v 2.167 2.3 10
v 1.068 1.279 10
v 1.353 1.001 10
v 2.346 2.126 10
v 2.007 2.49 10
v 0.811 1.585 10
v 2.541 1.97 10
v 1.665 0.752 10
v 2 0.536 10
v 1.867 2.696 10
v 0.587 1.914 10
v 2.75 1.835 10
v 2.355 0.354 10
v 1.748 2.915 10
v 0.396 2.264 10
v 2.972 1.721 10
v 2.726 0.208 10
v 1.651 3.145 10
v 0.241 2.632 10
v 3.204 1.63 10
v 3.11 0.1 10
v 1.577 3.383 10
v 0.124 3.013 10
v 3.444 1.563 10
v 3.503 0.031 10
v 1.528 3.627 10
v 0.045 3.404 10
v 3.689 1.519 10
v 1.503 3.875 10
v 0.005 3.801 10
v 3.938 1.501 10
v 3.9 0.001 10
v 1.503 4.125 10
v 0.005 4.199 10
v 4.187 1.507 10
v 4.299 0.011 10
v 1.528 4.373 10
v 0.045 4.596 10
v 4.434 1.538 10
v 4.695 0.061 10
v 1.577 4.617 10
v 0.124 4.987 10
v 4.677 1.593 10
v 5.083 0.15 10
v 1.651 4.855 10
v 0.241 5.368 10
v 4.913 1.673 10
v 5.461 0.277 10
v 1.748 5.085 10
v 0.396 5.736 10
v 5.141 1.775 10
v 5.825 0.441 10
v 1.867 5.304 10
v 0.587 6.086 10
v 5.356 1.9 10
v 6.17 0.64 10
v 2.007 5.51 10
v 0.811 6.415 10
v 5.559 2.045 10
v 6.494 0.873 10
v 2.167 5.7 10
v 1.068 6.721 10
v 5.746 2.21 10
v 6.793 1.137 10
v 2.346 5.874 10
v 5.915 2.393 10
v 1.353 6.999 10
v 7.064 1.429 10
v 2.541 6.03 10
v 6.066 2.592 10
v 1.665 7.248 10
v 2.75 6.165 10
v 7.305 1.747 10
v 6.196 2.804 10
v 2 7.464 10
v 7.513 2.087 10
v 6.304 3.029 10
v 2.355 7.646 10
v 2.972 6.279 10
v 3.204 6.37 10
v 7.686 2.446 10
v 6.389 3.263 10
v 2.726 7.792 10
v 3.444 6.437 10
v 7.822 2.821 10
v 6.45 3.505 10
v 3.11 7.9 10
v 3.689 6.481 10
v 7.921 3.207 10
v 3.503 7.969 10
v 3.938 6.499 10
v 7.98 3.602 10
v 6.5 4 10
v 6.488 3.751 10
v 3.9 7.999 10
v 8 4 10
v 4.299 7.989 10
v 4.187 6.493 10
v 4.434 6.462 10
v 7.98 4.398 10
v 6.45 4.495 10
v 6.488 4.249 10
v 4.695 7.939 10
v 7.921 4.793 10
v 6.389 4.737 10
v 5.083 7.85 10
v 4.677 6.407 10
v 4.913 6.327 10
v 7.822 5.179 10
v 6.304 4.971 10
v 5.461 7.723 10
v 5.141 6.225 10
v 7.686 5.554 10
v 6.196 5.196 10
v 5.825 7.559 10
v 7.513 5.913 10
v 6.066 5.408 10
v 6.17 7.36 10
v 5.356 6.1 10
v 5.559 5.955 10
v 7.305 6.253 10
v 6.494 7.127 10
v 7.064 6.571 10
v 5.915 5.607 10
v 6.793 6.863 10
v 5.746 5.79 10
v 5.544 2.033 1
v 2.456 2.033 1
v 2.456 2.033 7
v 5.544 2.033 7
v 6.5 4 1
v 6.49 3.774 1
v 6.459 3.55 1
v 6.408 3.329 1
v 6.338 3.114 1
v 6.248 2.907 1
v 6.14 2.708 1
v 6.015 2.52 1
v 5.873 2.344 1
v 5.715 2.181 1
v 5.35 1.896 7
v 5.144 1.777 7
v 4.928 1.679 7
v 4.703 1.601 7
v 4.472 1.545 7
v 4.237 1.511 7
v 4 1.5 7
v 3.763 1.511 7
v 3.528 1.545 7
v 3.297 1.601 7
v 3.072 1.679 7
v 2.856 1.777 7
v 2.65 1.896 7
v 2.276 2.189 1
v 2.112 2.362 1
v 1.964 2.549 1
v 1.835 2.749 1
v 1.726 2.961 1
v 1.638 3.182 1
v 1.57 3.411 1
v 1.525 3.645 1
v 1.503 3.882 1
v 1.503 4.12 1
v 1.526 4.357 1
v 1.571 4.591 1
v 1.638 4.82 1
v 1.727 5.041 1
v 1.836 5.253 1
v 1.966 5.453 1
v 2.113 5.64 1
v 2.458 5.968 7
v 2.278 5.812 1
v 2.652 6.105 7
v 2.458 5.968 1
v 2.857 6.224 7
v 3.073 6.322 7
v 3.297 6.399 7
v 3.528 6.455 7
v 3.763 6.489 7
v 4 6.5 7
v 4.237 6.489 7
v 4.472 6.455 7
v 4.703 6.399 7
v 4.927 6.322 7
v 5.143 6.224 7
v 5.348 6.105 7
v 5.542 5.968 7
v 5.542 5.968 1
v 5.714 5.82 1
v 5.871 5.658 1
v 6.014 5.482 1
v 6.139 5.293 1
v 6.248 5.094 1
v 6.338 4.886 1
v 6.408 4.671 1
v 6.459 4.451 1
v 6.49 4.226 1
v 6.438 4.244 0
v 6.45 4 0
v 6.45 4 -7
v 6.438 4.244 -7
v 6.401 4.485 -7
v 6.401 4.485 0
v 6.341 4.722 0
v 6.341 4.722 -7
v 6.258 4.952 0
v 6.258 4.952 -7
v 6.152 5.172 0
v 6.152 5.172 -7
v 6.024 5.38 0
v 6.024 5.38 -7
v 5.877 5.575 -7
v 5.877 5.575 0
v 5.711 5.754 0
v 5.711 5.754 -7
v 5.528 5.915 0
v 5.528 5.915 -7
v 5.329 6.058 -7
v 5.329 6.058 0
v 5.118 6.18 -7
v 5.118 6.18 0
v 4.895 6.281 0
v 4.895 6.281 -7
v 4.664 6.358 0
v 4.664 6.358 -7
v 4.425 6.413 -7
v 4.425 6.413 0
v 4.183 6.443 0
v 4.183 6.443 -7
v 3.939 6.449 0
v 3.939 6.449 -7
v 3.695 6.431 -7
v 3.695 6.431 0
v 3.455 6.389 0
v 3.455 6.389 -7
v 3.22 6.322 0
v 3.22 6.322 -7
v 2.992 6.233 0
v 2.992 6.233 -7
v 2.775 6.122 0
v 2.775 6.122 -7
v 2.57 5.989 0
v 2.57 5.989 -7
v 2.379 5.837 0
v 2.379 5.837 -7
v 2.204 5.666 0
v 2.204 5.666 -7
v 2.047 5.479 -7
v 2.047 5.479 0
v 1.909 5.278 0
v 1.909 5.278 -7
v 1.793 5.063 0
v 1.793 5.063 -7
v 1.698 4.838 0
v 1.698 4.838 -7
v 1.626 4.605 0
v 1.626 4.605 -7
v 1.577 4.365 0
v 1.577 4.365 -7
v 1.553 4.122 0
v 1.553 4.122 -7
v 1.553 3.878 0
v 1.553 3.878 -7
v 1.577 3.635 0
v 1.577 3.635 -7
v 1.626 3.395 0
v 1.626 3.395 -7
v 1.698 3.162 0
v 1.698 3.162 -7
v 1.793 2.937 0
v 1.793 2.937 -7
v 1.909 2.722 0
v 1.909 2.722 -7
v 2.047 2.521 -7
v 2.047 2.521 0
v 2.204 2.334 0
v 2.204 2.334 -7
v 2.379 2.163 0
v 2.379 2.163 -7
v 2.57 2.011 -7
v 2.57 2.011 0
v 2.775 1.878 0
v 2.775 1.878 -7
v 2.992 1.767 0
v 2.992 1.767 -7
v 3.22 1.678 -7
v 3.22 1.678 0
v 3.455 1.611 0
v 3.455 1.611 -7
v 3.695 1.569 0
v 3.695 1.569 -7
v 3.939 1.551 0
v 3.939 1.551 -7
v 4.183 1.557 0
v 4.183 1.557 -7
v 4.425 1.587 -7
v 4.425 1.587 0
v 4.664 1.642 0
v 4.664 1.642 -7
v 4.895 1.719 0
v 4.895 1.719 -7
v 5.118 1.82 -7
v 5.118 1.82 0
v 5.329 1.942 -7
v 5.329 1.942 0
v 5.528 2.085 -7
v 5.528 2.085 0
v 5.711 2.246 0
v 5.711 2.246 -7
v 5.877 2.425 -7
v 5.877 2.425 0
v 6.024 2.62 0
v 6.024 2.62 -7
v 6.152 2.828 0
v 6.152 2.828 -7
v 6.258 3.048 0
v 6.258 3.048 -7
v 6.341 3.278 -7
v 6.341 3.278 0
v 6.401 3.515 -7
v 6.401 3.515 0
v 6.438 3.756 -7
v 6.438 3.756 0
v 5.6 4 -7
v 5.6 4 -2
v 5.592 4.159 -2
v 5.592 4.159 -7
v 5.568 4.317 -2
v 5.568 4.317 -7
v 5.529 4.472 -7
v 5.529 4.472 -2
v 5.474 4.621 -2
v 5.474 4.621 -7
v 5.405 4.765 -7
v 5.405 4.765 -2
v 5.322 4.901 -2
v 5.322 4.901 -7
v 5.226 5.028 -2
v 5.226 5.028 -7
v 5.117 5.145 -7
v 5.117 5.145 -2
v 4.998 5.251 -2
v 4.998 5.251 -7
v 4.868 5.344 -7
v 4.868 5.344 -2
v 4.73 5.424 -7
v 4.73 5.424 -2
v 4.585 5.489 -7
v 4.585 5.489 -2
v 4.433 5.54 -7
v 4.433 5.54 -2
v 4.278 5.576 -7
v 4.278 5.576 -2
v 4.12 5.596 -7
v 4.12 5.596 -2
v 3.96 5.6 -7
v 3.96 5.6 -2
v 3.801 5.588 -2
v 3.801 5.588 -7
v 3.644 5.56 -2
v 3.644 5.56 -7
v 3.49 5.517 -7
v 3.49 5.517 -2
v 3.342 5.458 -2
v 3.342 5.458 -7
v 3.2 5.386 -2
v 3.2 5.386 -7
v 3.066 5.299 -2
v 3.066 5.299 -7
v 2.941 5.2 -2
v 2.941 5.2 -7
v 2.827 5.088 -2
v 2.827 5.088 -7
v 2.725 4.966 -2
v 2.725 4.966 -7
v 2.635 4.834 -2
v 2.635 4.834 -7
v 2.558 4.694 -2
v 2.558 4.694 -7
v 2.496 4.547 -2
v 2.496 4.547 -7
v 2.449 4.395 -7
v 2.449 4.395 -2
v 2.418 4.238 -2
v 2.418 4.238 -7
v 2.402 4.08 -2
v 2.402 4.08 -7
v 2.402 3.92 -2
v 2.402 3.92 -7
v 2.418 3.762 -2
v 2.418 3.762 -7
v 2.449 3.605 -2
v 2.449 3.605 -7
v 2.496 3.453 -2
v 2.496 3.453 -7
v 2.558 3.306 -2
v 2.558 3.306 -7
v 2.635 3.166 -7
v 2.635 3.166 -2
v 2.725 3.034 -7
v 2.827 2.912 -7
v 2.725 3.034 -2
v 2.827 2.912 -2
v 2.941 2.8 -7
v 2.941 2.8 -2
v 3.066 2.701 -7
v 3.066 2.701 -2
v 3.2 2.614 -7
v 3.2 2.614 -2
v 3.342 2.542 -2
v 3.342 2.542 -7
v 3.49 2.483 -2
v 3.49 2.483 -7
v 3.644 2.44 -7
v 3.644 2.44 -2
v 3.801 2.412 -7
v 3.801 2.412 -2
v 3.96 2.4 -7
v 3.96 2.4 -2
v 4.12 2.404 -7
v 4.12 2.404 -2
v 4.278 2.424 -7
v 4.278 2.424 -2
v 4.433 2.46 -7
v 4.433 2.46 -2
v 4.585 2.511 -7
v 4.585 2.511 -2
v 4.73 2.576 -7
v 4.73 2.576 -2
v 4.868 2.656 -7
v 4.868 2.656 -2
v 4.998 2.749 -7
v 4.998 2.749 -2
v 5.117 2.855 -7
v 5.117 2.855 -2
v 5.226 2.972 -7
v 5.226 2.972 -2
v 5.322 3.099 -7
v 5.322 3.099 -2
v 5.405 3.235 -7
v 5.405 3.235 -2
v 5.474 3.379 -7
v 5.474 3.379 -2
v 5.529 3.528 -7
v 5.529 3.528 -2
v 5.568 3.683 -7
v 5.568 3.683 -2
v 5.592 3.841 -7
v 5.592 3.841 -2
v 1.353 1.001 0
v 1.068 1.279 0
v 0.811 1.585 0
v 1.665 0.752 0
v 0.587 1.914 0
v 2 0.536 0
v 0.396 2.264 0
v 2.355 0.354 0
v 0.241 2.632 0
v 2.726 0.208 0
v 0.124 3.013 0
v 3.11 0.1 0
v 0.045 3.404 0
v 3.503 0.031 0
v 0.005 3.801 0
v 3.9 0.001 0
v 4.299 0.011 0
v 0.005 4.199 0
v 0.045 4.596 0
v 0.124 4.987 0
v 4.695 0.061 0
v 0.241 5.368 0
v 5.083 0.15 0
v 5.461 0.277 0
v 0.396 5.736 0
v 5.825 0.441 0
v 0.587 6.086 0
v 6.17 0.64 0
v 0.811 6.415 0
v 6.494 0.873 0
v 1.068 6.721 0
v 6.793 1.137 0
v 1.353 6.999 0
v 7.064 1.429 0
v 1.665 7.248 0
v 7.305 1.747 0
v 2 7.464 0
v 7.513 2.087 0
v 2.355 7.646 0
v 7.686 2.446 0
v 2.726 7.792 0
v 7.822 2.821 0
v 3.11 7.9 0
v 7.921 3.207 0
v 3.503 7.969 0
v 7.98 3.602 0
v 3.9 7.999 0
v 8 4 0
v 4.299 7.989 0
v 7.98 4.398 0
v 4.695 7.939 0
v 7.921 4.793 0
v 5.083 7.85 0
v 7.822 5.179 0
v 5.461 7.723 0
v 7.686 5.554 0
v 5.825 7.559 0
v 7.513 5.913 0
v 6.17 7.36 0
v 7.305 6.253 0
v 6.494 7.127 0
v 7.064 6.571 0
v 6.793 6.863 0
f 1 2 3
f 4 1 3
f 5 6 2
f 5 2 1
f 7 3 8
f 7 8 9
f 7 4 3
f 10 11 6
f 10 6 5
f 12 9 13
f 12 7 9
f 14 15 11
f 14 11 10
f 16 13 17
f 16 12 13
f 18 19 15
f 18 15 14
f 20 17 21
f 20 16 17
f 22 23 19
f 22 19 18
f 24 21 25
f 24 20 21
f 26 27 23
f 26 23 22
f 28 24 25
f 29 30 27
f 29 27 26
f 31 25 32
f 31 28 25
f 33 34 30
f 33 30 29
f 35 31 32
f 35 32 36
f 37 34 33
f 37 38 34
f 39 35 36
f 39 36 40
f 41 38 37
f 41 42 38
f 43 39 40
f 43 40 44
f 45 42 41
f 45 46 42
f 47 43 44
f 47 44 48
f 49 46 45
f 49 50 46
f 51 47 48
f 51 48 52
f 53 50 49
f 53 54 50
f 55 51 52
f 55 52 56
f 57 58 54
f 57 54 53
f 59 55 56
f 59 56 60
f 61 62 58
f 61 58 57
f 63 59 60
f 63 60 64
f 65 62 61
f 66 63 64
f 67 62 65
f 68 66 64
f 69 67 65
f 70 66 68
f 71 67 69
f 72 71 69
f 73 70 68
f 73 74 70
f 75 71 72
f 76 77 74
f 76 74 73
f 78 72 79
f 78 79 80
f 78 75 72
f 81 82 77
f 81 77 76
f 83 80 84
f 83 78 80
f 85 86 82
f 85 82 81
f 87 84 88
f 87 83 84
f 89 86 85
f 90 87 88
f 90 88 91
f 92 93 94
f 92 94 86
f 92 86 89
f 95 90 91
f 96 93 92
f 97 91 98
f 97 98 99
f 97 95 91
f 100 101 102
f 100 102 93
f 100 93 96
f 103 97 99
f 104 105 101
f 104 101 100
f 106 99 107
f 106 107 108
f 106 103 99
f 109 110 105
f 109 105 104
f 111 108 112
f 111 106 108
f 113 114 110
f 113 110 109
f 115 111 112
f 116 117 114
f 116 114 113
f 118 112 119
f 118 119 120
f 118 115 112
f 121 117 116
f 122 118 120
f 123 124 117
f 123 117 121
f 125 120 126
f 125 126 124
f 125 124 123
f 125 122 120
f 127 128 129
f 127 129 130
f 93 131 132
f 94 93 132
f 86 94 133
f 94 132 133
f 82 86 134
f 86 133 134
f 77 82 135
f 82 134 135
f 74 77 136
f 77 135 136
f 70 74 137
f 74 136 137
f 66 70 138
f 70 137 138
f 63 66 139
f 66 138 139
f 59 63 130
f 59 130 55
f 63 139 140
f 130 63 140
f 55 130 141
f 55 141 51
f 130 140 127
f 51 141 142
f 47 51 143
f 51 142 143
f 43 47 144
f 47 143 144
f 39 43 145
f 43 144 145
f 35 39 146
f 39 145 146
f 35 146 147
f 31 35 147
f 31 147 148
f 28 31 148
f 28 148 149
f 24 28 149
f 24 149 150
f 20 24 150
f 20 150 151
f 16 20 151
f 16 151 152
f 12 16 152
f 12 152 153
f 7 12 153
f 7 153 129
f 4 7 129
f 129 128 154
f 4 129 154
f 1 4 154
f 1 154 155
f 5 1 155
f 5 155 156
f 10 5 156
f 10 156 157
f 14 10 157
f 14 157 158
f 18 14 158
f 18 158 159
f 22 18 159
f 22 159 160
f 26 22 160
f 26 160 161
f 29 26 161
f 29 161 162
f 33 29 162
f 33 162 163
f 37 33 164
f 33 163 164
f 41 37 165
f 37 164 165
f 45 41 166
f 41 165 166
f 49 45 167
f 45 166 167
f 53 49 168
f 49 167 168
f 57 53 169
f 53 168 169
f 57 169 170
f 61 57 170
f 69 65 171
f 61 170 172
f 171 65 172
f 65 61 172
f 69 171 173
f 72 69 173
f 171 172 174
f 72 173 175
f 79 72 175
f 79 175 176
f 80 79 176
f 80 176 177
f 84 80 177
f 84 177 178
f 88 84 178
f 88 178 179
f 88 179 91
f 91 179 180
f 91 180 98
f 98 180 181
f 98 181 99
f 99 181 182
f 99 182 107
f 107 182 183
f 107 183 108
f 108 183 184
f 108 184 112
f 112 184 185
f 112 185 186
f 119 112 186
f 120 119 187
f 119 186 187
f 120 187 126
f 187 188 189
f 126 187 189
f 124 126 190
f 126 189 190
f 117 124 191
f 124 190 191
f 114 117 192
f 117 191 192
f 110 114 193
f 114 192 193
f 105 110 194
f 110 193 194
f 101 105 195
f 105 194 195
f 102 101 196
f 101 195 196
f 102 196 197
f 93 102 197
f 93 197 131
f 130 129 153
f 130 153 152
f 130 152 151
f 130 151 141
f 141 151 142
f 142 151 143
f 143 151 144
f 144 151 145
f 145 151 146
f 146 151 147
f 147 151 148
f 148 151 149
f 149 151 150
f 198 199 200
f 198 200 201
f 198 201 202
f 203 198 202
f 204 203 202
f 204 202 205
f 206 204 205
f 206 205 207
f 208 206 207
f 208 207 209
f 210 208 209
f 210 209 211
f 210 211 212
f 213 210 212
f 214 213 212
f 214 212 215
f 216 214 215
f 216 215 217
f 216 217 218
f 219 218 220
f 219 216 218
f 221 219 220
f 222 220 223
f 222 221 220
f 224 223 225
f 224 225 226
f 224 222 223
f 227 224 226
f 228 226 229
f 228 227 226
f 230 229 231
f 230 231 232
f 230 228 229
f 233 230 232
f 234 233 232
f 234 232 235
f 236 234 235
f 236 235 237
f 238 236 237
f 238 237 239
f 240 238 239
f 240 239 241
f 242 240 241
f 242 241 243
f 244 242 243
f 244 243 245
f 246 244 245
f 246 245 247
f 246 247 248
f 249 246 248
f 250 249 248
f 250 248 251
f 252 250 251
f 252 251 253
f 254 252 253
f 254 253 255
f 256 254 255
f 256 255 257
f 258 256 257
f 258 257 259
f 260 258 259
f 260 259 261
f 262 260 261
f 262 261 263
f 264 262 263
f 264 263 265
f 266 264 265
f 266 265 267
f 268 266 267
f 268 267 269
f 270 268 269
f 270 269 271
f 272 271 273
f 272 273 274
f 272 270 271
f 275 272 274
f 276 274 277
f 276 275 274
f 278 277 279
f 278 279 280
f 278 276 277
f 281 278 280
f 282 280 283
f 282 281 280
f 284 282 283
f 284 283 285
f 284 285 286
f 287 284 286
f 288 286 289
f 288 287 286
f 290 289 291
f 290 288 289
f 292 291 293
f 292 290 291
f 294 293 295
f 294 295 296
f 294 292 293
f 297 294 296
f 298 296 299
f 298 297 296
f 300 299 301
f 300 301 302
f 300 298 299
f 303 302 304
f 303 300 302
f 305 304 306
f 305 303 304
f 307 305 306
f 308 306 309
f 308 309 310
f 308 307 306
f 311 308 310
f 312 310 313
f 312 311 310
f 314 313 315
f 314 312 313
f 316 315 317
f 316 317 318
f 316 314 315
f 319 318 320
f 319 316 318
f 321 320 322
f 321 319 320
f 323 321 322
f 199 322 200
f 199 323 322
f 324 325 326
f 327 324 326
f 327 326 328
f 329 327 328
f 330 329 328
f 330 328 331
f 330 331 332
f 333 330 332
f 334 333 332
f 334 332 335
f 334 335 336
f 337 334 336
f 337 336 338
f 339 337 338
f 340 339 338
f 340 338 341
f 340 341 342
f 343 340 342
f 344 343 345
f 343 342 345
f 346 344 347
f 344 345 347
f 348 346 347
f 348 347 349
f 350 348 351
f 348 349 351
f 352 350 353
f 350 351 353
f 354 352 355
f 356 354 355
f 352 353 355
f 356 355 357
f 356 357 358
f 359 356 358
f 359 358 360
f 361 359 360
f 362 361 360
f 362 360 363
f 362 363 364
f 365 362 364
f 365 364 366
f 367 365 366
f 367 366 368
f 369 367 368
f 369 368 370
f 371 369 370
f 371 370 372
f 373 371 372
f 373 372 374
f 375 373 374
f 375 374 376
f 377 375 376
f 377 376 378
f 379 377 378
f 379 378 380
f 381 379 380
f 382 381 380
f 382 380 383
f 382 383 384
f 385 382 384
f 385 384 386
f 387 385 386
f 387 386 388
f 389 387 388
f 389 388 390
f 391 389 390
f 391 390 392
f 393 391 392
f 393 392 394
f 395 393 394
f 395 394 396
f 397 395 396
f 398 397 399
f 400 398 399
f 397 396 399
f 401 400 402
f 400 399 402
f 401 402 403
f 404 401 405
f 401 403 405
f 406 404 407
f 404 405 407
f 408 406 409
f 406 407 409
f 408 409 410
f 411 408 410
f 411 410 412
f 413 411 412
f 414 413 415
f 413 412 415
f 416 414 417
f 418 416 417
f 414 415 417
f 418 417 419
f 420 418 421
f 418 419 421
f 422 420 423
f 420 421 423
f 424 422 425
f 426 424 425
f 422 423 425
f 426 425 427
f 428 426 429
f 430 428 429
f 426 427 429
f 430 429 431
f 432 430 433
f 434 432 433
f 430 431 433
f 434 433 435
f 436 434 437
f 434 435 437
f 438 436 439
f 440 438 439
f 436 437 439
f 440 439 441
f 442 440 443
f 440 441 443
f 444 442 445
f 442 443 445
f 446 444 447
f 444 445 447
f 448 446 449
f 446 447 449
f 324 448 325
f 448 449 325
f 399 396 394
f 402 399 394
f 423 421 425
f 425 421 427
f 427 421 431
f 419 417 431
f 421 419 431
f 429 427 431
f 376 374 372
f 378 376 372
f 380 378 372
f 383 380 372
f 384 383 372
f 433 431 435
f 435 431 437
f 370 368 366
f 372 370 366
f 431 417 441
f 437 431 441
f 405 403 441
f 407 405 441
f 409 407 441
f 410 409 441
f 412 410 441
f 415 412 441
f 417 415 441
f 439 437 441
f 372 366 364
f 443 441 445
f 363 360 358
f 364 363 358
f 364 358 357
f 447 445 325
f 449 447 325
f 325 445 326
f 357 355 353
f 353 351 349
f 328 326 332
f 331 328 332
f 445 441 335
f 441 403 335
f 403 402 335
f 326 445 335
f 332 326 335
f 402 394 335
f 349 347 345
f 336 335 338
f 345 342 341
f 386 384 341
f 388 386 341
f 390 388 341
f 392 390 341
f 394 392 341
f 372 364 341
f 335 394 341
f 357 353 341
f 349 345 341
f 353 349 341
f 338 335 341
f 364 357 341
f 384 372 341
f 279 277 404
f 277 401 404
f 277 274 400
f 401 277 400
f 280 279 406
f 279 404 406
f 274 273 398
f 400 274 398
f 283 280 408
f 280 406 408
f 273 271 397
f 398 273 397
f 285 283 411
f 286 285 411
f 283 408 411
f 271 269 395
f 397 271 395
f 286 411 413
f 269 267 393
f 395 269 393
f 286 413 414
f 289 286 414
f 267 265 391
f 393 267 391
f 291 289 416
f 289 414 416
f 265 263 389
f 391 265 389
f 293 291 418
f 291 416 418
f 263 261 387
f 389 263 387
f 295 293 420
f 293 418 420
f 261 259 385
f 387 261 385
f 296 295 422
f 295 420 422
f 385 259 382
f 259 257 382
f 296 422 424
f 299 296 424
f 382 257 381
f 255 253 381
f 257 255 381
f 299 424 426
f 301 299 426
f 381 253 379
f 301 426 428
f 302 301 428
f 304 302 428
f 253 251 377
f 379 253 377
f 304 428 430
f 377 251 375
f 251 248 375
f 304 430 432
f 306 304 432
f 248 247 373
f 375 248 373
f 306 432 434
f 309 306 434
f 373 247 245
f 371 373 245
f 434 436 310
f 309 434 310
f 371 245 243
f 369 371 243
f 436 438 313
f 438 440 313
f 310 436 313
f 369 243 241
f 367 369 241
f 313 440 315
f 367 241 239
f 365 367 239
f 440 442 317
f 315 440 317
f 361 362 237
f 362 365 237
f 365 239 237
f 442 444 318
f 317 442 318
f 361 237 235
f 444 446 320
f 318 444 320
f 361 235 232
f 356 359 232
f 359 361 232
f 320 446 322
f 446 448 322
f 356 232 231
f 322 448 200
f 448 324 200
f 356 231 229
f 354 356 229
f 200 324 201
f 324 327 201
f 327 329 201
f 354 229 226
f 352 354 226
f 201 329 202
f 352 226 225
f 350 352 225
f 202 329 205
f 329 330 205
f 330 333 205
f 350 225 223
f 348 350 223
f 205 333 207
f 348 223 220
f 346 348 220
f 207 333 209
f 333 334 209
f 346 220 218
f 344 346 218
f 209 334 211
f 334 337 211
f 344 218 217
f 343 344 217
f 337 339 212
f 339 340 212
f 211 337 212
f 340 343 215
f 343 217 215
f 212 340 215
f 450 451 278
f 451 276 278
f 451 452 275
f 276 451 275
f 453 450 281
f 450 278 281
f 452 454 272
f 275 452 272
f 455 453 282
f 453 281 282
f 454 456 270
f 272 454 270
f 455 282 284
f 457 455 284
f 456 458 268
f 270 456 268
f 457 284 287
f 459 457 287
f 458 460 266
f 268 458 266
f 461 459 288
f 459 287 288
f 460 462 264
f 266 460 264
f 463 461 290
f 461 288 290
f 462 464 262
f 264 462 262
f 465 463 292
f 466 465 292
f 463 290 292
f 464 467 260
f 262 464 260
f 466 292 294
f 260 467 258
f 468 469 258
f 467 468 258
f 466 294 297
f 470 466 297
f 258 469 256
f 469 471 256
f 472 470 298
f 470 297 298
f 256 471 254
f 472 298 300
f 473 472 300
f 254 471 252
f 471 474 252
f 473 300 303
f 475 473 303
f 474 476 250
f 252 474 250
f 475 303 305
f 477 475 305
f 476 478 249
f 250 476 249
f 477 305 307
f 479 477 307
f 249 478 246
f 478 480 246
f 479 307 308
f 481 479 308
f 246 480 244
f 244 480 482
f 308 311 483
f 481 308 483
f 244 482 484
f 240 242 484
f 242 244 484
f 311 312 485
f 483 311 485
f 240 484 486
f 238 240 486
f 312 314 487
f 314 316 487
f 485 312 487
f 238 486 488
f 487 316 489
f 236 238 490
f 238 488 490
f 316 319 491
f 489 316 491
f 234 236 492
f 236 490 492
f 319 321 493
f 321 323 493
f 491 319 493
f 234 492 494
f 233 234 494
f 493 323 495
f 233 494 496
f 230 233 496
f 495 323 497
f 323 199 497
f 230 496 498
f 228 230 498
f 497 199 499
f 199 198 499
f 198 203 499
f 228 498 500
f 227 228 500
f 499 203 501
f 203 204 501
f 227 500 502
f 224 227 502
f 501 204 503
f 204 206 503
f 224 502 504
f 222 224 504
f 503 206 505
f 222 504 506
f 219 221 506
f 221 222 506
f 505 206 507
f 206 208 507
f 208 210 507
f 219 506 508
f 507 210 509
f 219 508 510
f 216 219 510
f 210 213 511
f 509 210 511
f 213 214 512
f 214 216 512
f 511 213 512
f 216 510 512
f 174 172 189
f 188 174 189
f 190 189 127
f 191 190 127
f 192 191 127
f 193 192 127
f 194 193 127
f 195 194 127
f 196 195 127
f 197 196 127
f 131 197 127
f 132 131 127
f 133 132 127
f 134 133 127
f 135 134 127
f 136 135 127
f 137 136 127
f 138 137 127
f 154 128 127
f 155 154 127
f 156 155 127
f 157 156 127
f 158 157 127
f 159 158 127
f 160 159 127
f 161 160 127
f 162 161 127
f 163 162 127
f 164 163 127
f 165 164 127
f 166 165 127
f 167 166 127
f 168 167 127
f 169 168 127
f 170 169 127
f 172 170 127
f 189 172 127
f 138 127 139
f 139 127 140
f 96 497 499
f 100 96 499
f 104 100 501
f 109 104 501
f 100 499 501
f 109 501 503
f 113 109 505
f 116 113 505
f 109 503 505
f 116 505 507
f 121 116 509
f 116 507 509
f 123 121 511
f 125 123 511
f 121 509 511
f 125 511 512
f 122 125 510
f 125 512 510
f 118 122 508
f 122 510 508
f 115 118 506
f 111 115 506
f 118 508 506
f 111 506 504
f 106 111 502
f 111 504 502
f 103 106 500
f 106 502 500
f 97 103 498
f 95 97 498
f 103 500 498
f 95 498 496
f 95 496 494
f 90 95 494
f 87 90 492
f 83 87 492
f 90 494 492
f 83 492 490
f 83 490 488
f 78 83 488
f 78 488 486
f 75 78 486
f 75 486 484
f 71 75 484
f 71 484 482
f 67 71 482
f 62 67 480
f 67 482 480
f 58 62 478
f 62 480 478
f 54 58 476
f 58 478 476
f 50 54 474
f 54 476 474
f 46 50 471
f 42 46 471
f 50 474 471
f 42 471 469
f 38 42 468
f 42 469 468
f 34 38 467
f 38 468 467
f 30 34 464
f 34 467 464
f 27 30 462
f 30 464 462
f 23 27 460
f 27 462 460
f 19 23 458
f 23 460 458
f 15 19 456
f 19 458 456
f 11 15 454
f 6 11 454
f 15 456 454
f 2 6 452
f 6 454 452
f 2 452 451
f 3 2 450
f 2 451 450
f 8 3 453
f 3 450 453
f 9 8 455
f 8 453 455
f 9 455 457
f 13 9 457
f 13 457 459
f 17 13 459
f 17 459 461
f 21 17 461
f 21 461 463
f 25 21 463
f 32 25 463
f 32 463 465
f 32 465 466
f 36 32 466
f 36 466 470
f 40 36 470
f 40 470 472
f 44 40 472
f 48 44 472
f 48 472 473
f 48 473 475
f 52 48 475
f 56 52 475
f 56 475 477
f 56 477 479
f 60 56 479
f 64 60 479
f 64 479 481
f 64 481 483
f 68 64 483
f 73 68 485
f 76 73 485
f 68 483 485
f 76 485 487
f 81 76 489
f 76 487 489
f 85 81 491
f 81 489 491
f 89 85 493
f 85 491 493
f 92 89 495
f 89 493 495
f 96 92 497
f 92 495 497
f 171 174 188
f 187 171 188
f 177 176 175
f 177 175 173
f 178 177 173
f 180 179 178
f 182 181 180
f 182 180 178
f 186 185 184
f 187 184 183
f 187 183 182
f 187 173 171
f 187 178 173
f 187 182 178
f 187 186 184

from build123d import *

# Parameters (mm, degrees)
SKETCH007_R     = 2.45
PAD007_DEPTH    = 7
POCKET_START    = -2
SKETCH008_R     = 1.6
POCKET_DEPTH    = 6
SKETCH_R        = 4
PAD_DEPTH       = 10
POCKET001_START = -16
SKETCH010_R     = 2.5
POCKET001_DEPTH = 9
PAD008_DEPTH    = 7


with BuildPart() as part:
    # Sketch007 → Pad007 (new body)
    with BuildSketch(Plane.XY):
        with Locations((4, 4)):
            Circle(SKETCH007_R)
    extrude(amount=-PAD007_DEPTH)

    # Sketch008 → Pocket (cut)
    with BuildSketch(Plane.XY.offset(POCKET_START)):
        with Locations((4, 4)):
            Circle(SKETCH008_R)
    extrude(amount=-POCKET_DEPTH, mode=Mode.SUBTRACT)

    # Sketch → Pad (join)
    with BuildSketch(Plane.XY):
        with Locations((4, 4)):
            Circle(SKETCH_R)
    extrude(amount=PAD_DEPTH)

    # Sketch010 → Pocket001 (cut)
    with BuildSketch(Plane(origin=(0, 0, -15), x_dir=(1, 0, 0), z_dir=(0, 0, -1)).offset(POCKET001_START)):
        with Locations((4, -4)):
            Circle(SKETCH010_R)
    extrude(amount=-POCKET001_DEPTH, mode=Mode.SUBTRACT)

    # Sketch009 → Pad008 (join)
    with BuildSketch(Plane.XY):
        with BuildLine():
            ThreePointArc((5.541903, 5.967876), (4, 6.5), (2.458097, 5.967876))
            Line((2.458097, 5.967876), (5.541903, 5.967876))
        make_face()
        with BuildLine():
            ThreePointArc((2.456381, 2.03347), (4, 1.5), (5.543619, 2.03347))
            Line((2.456381, 2.03347), (5.543619, 2.03347))
        make_face()
    extrude(amount=PAD008_DEPTH)


solid = part.part
